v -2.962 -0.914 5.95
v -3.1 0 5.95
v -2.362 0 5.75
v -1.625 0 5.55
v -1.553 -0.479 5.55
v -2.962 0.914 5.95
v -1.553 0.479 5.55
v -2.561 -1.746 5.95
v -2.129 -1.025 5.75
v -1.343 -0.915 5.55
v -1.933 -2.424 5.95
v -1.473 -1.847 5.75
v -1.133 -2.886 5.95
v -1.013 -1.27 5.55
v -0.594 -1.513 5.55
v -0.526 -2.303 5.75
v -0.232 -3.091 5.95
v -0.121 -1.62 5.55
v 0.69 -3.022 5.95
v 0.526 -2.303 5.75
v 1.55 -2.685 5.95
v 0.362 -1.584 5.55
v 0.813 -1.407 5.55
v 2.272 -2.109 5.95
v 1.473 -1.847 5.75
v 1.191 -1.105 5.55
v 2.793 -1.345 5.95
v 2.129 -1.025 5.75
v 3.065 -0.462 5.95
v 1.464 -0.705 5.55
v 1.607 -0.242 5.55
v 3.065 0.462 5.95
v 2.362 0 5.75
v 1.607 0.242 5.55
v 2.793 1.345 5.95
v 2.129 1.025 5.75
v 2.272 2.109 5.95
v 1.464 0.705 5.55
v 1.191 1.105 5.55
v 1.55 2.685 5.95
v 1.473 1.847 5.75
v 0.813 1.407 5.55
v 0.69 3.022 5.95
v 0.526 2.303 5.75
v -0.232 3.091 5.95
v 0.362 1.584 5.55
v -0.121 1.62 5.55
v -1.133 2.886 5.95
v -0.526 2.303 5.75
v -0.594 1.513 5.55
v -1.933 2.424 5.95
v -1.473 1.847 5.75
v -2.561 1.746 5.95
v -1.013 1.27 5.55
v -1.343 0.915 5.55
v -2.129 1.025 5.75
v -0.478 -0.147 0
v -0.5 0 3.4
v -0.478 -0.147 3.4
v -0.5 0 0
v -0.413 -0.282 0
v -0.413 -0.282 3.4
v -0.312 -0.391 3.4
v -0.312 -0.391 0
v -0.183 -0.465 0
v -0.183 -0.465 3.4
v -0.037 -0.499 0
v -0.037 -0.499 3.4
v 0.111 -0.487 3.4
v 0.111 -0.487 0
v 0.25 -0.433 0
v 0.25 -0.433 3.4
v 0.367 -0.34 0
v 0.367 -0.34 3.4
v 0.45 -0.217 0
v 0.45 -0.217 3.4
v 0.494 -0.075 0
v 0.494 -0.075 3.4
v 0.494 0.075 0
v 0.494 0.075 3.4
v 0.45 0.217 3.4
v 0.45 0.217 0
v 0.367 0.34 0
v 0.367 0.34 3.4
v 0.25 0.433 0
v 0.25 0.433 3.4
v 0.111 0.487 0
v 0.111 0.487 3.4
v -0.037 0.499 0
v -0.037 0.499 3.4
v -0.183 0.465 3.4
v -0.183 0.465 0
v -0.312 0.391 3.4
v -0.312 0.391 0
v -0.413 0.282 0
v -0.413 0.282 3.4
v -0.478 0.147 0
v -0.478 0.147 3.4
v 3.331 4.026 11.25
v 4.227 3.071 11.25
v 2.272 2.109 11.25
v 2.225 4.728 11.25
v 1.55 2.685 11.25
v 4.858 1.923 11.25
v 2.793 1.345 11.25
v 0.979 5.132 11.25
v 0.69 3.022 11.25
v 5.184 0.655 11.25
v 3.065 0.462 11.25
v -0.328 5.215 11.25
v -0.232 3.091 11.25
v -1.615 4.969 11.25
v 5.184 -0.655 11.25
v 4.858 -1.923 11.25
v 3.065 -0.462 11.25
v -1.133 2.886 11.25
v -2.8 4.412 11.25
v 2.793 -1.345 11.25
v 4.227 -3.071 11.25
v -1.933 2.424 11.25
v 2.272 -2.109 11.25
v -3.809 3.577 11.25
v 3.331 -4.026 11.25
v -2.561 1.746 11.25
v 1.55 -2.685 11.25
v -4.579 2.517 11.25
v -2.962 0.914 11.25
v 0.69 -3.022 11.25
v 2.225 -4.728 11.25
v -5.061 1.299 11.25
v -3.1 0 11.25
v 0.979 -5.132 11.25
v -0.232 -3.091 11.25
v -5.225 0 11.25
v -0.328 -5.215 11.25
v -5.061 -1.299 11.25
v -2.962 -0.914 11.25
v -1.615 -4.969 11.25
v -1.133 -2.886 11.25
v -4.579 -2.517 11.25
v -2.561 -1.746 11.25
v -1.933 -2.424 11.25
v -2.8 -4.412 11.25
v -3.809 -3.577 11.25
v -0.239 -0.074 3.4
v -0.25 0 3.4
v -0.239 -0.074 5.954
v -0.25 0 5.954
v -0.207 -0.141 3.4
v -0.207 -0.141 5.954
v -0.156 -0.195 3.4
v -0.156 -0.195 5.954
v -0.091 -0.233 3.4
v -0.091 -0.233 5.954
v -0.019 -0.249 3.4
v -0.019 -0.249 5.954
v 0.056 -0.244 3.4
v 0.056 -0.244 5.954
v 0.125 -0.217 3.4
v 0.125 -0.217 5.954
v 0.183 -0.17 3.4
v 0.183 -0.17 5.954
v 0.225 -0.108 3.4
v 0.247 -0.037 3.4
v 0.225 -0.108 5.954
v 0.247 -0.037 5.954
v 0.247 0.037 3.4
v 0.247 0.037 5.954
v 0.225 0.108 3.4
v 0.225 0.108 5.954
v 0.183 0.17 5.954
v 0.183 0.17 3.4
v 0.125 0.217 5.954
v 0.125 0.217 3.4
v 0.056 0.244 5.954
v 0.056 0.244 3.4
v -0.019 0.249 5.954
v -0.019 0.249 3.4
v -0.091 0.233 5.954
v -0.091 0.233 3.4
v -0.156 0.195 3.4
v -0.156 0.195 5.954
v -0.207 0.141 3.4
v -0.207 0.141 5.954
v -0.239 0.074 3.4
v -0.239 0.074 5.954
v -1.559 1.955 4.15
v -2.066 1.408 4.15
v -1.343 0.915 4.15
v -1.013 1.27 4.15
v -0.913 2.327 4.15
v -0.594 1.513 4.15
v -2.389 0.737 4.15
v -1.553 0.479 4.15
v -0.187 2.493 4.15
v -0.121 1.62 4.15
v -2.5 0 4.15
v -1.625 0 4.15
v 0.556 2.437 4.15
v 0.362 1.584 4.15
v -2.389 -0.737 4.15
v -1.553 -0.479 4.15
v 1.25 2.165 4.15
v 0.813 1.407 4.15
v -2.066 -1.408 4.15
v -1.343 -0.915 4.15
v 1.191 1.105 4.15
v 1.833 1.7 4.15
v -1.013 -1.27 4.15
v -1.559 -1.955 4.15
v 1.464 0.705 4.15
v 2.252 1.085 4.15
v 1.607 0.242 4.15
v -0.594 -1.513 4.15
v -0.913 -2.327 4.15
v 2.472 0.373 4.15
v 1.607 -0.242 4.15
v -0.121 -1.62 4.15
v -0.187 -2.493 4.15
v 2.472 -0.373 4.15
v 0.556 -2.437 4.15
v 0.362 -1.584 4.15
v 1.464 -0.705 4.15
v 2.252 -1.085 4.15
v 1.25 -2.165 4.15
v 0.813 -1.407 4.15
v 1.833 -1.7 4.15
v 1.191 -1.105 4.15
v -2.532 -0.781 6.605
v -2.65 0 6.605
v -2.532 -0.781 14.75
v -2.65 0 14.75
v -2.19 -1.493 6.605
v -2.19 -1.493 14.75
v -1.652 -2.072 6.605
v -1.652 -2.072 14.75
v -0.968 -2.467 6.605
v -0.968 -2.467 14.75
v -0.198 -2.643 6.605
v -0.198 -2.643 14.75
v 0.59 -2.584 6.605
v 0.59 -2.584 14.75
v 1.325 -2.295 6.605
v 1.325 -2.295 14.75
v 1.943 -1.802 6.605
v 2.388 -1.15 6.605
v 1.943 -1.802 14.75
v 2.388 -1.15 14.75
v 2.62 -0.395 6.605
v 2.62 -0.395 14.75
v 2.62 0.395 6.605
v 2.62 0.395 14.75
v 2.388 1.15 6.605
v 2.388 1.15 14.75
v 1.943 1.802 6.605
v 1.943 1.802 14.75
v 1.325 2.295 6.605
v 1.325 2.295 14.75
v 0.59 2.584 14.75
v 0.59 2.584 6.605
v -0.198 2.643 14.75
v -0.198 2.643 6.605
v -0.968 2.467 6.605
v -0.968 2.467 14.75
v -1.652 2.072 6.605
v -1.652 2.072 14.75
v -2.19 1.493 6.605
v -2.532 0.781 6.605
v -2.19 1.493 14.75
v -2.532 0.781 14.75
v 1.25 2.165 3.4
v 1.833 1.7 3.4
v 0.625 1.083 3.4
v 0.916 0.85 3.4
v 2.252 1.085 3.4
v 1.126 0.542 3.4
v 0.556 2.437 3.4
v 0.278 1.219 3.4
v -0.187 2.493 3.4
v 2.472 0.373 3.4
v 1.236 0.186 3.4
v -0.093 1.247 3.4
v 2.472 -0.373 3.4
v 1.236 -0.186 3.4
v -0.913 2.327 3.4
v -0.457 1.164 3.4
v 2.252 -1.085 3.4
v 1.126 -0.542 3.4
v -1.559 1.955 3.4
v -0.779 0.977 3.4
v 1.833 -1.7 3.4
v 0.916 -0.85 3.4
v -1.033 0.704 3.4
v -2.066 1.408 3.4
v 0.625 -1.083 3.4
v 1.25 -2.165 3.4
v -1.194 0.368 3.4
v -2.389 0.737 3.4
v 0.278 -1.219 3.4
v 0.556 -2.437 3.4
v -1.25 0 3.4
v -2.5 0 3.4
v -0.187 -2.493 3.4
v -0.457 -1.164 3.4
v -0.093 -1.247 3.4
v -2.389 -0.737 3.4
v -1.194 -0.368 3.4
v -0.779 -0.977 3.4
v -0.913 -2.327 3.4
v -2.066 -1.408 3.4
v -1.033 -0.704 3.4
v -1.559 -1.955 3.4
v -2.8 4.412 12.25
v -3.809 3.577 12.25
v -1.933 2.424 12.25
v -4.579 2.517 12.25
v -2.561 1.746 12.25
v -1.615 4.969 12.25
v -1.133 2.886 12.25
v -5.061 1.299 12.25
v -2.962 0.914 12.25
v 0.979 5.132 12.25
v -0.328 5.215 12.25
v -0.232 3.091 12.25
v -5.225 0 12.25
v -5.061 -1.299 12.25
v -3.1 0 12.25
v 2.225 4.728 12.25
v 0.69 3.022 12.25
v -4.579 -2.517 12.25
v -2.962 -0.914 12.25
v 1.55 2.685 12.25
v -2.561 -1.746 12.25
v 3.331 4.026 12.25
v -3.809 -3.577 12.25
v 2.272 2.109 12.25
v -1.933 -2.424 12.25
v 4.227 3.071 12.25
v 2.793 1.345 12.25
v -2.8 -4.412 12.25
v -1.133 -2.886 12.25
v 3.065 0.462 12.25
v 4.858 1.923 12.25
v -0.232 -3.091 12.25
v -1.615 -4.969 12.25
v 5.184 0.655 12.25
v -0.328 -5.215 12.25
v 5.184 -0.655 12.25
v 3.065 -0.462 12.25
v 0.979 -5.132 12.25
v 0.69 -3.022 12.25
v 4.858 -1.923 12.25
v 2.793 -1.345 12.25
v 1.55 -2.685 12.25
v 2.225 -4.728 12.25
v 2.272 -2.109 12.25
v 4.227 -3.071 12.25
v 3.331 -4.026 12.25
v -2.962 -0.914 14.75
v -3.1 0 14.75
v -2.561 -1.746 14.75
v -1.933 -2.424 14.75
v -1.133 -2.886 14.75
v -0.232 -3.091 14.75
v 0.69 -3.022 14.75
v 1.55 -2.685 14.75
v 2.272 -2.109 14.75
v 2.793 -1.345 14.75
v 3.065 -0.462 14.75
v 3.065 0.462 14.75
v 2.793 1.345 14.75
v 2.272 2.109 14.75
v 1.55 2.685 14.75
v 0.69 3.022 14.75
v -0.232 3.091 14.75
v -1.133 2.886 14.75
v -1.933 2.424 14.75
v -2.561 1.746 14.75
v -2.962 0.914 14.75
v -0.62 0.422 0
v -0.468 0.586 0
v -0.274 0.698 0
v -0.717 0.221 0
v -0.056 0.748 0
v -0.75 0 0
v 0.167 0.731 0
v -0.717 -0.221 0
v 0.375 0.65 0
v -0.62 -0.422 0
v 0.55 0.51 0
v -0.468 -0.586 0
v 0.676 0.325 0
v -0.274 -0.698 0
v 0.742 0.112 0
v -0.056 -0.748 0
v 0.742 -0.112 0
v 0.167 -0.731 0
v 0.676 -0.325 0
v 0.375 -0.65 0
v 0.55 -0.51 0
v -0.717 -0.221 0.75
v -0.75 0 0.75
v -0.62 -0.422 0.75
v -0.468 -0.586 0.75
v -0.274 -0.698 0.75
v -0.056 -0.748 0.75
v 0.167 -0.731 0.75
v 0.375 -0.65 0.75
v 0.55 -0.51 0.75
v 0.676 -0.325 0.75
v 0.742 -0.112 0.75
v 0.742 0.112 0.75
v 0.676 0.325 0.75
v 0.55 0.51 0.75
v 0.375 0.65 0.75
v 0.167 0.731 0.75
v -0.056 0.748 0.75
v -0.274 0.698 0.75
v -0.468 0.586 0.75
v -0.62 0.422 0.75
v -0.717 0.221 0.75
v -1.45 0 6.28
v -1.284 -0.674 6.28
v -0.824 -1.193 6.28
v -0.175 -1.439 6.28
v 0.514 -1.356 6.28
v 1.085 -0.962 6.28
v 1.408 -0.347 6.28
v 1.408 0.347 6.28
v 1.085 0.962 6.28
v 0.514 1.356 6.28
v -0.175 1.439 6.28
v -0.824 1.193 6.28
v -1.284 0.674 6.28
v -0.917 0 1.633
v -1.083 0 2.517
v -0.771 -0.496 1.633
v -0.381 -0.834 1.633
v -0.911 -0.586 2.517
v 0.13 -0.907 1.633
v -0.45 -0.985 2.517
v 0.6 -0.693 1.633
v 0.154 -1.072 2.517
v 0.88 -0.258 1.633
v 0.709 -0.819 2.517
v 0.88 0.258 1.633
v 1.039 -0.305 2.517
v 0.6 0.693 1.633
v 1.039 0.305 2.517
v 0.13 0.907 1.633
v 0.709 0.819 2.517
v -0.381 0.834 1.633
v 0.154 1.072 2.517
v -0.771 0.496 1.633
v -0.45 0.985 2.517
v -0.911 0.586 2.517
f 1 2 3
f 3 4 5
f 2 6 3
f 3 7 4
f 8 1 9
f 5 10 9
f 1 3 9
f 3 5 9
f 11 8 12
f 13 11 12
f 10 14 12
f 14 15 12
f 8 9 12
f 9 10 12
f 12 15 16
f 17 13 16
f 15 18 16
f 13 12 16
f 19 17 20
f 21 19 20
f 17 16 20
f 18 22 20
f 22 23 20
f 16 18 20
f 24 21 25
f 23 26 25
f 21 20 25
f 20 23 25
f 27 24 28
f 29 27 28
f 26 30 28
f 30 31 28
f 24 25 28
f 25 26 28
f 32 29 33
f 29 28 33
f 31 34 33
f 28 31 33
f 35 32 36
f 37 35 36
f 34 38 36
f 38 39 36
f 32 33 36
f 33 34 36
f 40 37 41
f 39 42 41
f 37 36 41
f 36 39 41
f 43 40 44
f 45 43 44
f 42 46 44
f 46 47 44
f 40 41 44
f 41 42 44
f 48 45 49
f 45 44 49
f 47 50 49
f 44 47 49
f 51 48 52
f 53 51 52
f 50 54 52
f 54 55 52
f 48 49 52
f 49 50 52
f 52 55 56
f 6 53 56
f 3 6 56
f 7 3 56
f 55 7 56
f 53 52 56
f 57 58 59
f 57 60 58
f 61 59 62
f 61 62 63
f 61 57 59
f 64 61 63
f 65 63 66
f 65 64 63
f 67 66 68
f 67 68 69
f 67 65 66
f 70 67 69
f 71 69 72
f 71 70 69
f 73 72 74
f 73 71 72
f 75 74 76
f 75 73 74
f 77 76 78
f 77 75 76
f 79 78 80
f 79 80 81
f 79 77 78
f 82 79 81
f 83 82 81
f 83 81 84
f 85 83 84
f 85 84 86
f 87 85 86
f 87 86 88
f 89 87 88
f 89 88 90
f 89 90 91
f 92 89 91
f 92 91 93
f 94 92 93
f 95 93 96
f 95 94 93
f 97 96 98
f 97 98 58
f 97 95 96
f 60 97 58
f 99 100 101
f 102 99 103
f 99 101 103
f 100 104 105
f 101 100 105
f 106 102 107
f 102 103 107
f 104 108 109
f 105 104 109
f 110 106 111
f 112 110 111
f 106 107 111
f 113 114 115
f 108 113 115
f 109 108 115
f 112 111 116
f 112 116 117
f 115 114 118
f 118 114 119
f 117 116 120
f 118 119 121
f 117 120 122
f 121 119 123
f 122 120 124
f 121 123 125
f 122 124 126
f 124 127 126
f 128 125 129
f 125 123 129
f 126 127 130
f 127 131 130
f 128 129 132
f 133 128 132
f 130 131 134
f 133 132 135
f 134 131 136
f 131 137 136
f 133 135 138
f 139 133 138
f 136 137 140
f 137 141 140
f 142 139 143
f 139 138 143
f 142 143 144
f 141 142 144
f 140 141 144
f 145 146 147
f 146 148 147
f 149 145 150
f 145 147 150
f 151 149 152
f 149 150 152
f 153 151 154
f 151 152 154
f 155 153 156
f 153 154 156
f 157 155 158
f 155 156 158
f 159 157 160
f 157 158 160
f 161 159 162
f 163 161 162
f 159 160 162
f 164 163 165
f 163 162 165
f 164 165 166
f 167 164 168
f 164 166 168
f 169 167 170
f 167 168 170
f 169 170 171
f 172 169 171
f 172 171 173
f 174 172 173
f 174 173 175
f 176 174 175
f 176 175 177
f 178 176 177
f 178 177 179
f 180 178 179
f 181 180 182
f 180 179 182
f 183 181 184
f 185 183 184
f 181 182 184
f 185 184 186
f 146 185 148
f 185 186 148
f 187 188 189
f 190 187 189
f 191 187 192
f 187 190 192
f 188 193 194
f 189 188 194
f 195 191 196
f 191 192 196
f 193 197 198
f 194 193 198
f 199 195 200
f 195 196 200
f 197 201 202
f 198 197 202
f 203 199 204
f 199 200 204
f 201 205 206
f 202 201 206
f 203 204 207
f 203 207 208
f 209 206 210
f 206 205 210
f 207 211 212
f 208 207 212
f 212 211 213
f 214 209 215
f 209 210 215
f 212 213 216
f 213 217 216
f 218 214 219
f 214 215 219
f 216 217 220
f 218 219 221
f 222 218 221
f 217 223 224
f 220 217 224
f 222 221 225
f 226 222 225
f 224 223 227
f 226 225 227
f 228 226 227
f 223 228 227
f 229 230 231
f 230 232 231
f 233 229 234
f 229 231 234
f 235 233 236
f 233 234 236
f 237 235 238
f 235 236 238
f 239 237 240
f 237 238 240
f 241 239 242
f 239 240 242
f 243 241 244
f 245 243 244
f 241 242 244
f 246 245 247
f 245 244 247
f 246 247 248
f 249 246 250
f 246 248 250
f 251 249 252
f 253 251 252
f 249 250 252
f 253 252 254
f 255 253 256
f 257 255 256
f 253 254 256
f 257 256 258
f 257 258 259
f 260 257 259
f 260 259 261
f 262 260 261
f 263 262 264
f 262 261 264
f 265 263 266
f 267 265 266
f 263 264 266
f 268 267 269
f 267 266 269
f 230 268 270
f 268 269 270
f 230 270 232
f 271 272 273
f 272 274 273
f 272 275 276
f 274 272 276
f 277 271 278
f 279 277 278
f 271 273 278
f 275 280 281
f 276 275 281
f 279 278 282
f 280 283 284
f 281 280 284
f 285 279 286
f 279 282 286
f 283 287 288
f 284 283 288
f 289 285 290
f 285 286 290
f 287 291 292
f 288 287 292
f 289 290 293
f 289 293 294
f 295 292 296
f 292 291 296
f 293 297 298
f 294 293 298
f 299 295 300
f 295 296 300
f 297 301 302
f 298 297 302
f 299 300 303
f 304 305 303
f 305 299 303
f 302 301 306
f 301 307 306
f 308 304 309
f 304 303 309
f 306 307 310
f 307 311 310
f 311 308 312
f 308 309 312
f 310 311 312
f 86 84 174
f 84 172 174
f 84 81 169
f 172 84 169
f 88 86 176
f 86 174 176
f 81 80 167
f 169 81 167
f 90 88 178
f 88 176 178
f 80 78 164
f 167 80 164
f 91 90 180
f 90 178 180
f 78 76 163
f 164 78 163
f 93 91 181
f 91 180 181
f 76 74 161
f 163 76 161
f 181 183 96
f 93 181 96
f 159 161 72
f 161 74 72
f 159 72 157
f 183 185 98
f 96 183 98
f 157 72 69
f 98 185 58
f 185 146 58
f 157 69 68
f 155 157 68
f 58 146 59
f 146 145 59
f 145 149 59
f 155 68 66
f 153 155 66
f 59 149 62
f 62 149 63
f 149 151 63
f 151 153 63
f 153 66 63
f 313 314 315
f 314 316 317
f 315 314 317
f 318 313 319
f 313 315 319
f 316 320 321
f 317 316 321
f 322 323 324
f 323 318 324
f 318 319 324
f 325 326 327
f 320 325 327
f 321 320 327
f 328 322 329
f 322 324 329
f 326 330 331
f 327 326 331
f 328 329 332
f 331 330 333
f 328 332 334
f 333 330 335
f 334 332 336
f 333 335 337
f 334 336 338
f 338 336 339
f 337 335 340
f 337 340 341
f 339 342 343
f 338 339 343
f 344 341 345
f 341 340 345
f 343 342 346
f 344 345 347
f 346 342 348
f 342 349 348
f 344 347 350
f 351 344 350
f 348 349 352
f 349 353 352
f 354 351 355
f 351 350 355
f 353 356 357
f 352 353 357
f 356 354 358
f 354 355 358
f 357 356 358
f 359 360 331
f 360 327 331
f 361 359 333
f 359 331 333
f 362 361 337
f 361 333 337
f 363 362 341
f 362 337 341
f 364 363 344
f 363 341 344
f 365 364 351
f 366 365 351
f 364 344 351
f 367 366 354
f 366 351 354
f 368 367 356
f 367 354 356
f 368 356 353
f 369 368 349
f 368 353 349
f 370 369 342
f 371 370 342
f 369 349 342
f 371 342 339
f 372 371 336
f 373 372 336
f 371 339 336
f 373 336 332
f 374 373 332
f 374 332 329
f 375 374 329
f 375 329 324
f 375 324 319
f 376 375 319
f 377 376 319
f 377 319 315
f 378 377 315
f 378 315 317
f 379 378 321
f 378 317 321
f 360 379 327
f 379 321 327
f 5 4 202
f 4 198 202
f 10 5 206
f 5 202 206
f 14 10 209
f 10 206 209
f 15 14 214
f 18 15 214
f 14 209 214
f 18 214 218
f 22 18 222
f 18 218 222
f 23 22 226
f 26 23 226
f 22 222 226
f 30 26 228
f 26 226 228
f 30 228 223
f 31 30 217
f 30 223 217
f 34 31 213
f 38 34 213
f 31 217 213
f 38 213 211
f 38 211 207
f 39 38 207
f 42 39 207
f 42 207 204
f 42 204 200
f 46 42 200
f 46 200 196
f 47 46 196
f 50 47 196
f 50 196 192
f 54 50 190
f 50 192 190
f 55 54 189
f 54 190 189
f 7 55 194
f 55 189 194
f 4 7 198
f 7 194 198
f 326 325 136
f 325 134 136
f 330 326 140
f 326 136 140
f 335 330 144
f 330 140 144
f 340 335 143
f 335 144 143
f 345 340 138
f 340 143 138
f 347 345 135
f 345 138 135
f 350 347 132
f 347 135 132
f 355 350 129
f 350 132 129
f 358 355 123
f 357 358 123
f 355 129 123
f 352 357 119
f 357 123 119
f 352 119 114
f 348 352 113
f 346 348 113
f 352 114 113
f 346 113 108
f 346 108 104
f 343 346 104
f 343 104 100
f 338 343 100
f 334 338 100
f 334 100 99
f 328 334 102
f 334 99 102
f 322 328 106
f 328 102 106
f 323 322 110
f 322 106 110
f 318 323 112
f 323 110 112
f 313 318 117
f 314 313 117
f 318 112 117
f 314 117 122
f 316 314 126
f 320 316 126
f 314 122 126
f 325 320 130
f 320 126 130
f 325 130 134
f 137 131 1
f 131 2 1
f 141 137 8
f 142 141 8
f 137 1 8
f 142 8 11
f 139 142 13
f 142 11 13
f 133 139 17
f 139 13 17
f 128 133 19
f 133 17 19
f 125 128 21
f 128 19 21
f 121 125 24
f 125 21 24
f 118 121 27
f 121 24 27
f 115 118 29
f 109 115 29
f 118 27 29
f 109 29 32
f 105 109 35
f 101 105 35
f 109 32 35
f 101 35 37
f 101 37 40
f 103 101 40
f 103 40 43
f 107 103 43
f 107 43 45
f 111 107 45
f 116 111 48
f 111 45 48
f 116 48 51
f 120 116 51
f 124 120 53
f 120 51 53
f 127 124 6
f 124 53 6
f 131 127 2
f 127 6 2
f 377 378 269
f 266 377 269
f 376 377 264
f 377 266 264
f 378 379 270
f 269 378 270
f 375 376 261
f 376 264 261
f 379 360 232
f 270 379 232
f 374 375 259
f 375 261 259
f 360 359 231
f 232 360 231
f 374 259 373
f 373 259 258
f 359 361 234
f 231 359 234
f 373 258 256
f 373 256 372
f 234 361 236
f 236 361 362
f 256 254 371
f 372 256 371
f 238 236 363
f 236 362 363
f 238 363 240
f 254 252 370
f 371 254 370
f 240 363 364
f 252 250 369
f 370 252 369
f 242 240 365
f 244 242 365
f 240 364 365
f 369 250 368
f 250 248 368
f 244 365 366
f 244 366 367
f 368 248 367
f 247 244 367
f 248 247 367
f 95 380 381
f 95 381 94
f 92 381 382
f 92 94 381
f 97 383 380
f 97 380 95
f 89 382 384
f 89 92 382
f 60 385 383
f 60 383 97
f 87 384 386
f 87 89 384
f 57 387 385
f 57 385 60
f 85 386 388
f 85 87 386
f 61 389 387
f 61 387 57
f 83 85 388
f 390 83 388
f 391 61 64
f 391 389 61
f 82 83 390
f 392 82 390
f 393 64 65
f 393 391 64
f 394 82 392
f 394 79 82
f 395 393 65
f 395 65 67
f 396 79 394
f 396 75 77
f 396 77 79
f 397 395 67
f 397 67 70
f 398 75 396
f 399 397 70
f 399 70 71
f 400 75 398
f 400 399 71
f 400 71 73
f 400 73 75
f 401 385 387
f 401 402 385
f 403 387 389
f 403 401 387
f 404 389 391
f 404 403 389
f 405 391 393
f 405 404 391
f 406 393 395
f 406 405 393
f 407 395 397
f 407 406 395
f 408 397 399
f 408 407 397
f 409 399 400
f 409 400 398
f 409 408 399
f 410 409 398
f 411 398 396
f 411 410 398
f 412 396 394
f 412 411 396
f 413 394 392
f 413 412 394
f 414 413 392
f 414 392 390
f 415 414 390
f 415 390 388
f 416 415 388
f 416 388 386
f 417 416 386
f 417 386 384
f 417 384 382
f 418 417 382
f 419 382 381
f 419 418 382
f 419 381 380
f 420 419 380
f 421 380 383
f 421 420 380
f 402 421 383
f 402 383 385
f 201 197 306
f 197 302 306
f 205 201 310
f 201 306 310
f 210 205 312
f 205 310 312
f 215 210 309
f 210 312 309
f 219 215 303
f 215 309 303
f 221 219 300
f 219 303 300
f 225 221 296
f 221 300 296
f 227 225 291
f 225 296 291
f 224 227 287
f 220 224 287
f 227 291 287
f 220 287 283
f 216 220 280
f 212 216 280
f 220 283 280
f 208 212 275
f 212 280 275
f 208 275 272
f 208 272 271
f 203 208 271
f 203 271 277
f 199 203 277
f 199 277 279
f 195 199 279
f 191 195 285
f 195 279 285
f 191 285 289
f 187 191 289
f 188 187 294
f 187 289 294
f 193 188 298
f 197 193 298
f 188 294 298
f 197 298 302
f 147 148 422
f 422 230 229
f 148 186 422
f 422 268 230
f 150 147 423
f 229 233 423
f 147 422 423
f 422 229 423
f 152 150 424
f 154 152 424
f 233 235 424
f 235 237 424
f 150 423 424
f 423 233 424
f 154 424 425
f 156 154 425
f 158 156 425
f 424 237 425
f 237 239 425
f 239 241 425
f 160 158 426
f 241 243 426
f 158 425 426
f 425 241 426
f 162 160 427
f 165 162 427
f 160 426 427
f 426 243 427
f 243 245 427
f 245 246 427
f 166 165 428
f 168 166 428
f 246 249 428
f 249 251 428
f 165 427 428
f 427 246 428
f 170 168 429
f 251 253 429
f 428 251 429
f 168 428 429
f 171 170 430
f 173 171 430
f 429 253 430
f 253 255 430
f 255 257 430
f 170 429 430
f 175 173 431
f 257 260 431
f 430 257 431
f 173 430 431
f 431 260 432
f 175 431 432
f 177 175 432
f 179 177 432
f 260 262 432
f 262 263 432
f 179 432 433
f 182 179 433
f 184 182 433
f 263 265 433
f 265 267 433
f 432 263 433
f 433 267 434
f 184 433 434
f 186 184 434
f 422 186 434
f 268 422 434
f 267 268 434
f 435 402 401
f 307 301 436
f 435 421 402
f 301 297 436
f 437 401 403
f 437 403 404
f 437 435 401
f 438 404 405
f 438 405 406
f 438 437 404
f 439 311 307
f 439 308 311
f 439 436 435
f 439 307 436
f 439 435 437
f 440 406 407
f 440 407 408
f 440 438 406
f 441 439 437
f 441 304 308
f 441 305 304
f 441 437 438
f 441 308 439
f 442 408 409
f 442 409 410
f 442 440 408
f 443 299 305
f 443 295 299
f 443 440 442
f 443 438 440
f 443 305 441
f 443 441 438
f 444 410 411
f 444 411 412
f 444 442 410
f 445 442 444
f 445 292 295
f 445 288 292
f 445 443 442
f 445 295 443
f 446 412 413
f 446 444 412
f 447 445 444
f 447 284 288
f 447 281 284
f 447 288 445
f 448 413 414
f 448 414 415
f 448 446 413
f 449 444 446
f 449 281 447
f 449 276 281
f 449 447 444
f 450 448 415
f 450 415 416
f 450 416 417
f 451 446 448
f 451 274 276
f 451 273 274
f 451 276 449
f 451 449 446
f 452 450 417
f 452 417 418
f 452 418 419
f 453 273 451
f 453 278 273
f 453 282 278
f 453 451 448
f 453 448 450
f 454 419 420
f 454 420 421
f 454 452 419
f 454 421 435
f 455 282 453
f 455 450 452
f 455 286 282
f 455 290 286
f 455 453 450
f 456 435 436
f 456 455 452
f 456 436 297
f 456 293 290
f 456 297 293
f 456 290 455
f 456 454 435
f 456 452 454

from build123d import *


with BuildPart() as part:
    # Body Sketch → Body Revolve (revolve)
    with BuildSketch(Plane(origin=(0, 0, 0), x_dir=(1, 0, 0), z_dir=(0, 1, 0)), mode=Mode.PRIVATE) as body_revolve_sk:
        Polygon((2.65, -14.75), (3.1, -14.75), (3.1, -12.25), (5.225, -12.25), (5.225, -11.25), (3.1, -11.25), (3.1, -5.95), (1.625, -5.55), (1.625, -4.15), (2.5, -4.15), (2.5, -3.4), (0.25, -3.4), (0.25, -5.954207714), (2.65, -6.605055172), align=None)
    revolve(body_revolve_sk.sketch.rotate(Axis((0, 0, 0), (0, 0, 1)), 180), axis=Axis((0, 0, 0), (0, 0, 1)))

    # N08 Sketch → N08 Revolve (revolve)
    with BuildSketch(Plane(origin=(0, 0, 0), x_dir=(1, 0, 0), z_dir=(0, 1, 0)), mode=Mode.PRIVATE) as n08_revolve_sk:
        Polygon((0.5, 0), (0.75, 0), (0.75, -0.75), (1.25, -3.4), (0.5, -3.4), align=None)
    revolve(n08_revolve_sk.sketch.rotate(Axis((0, 0, 0), (0, 0, 1)), 180), axis=Axis((0, 0, 0), (0, 0, 1)))


solid = part.part
